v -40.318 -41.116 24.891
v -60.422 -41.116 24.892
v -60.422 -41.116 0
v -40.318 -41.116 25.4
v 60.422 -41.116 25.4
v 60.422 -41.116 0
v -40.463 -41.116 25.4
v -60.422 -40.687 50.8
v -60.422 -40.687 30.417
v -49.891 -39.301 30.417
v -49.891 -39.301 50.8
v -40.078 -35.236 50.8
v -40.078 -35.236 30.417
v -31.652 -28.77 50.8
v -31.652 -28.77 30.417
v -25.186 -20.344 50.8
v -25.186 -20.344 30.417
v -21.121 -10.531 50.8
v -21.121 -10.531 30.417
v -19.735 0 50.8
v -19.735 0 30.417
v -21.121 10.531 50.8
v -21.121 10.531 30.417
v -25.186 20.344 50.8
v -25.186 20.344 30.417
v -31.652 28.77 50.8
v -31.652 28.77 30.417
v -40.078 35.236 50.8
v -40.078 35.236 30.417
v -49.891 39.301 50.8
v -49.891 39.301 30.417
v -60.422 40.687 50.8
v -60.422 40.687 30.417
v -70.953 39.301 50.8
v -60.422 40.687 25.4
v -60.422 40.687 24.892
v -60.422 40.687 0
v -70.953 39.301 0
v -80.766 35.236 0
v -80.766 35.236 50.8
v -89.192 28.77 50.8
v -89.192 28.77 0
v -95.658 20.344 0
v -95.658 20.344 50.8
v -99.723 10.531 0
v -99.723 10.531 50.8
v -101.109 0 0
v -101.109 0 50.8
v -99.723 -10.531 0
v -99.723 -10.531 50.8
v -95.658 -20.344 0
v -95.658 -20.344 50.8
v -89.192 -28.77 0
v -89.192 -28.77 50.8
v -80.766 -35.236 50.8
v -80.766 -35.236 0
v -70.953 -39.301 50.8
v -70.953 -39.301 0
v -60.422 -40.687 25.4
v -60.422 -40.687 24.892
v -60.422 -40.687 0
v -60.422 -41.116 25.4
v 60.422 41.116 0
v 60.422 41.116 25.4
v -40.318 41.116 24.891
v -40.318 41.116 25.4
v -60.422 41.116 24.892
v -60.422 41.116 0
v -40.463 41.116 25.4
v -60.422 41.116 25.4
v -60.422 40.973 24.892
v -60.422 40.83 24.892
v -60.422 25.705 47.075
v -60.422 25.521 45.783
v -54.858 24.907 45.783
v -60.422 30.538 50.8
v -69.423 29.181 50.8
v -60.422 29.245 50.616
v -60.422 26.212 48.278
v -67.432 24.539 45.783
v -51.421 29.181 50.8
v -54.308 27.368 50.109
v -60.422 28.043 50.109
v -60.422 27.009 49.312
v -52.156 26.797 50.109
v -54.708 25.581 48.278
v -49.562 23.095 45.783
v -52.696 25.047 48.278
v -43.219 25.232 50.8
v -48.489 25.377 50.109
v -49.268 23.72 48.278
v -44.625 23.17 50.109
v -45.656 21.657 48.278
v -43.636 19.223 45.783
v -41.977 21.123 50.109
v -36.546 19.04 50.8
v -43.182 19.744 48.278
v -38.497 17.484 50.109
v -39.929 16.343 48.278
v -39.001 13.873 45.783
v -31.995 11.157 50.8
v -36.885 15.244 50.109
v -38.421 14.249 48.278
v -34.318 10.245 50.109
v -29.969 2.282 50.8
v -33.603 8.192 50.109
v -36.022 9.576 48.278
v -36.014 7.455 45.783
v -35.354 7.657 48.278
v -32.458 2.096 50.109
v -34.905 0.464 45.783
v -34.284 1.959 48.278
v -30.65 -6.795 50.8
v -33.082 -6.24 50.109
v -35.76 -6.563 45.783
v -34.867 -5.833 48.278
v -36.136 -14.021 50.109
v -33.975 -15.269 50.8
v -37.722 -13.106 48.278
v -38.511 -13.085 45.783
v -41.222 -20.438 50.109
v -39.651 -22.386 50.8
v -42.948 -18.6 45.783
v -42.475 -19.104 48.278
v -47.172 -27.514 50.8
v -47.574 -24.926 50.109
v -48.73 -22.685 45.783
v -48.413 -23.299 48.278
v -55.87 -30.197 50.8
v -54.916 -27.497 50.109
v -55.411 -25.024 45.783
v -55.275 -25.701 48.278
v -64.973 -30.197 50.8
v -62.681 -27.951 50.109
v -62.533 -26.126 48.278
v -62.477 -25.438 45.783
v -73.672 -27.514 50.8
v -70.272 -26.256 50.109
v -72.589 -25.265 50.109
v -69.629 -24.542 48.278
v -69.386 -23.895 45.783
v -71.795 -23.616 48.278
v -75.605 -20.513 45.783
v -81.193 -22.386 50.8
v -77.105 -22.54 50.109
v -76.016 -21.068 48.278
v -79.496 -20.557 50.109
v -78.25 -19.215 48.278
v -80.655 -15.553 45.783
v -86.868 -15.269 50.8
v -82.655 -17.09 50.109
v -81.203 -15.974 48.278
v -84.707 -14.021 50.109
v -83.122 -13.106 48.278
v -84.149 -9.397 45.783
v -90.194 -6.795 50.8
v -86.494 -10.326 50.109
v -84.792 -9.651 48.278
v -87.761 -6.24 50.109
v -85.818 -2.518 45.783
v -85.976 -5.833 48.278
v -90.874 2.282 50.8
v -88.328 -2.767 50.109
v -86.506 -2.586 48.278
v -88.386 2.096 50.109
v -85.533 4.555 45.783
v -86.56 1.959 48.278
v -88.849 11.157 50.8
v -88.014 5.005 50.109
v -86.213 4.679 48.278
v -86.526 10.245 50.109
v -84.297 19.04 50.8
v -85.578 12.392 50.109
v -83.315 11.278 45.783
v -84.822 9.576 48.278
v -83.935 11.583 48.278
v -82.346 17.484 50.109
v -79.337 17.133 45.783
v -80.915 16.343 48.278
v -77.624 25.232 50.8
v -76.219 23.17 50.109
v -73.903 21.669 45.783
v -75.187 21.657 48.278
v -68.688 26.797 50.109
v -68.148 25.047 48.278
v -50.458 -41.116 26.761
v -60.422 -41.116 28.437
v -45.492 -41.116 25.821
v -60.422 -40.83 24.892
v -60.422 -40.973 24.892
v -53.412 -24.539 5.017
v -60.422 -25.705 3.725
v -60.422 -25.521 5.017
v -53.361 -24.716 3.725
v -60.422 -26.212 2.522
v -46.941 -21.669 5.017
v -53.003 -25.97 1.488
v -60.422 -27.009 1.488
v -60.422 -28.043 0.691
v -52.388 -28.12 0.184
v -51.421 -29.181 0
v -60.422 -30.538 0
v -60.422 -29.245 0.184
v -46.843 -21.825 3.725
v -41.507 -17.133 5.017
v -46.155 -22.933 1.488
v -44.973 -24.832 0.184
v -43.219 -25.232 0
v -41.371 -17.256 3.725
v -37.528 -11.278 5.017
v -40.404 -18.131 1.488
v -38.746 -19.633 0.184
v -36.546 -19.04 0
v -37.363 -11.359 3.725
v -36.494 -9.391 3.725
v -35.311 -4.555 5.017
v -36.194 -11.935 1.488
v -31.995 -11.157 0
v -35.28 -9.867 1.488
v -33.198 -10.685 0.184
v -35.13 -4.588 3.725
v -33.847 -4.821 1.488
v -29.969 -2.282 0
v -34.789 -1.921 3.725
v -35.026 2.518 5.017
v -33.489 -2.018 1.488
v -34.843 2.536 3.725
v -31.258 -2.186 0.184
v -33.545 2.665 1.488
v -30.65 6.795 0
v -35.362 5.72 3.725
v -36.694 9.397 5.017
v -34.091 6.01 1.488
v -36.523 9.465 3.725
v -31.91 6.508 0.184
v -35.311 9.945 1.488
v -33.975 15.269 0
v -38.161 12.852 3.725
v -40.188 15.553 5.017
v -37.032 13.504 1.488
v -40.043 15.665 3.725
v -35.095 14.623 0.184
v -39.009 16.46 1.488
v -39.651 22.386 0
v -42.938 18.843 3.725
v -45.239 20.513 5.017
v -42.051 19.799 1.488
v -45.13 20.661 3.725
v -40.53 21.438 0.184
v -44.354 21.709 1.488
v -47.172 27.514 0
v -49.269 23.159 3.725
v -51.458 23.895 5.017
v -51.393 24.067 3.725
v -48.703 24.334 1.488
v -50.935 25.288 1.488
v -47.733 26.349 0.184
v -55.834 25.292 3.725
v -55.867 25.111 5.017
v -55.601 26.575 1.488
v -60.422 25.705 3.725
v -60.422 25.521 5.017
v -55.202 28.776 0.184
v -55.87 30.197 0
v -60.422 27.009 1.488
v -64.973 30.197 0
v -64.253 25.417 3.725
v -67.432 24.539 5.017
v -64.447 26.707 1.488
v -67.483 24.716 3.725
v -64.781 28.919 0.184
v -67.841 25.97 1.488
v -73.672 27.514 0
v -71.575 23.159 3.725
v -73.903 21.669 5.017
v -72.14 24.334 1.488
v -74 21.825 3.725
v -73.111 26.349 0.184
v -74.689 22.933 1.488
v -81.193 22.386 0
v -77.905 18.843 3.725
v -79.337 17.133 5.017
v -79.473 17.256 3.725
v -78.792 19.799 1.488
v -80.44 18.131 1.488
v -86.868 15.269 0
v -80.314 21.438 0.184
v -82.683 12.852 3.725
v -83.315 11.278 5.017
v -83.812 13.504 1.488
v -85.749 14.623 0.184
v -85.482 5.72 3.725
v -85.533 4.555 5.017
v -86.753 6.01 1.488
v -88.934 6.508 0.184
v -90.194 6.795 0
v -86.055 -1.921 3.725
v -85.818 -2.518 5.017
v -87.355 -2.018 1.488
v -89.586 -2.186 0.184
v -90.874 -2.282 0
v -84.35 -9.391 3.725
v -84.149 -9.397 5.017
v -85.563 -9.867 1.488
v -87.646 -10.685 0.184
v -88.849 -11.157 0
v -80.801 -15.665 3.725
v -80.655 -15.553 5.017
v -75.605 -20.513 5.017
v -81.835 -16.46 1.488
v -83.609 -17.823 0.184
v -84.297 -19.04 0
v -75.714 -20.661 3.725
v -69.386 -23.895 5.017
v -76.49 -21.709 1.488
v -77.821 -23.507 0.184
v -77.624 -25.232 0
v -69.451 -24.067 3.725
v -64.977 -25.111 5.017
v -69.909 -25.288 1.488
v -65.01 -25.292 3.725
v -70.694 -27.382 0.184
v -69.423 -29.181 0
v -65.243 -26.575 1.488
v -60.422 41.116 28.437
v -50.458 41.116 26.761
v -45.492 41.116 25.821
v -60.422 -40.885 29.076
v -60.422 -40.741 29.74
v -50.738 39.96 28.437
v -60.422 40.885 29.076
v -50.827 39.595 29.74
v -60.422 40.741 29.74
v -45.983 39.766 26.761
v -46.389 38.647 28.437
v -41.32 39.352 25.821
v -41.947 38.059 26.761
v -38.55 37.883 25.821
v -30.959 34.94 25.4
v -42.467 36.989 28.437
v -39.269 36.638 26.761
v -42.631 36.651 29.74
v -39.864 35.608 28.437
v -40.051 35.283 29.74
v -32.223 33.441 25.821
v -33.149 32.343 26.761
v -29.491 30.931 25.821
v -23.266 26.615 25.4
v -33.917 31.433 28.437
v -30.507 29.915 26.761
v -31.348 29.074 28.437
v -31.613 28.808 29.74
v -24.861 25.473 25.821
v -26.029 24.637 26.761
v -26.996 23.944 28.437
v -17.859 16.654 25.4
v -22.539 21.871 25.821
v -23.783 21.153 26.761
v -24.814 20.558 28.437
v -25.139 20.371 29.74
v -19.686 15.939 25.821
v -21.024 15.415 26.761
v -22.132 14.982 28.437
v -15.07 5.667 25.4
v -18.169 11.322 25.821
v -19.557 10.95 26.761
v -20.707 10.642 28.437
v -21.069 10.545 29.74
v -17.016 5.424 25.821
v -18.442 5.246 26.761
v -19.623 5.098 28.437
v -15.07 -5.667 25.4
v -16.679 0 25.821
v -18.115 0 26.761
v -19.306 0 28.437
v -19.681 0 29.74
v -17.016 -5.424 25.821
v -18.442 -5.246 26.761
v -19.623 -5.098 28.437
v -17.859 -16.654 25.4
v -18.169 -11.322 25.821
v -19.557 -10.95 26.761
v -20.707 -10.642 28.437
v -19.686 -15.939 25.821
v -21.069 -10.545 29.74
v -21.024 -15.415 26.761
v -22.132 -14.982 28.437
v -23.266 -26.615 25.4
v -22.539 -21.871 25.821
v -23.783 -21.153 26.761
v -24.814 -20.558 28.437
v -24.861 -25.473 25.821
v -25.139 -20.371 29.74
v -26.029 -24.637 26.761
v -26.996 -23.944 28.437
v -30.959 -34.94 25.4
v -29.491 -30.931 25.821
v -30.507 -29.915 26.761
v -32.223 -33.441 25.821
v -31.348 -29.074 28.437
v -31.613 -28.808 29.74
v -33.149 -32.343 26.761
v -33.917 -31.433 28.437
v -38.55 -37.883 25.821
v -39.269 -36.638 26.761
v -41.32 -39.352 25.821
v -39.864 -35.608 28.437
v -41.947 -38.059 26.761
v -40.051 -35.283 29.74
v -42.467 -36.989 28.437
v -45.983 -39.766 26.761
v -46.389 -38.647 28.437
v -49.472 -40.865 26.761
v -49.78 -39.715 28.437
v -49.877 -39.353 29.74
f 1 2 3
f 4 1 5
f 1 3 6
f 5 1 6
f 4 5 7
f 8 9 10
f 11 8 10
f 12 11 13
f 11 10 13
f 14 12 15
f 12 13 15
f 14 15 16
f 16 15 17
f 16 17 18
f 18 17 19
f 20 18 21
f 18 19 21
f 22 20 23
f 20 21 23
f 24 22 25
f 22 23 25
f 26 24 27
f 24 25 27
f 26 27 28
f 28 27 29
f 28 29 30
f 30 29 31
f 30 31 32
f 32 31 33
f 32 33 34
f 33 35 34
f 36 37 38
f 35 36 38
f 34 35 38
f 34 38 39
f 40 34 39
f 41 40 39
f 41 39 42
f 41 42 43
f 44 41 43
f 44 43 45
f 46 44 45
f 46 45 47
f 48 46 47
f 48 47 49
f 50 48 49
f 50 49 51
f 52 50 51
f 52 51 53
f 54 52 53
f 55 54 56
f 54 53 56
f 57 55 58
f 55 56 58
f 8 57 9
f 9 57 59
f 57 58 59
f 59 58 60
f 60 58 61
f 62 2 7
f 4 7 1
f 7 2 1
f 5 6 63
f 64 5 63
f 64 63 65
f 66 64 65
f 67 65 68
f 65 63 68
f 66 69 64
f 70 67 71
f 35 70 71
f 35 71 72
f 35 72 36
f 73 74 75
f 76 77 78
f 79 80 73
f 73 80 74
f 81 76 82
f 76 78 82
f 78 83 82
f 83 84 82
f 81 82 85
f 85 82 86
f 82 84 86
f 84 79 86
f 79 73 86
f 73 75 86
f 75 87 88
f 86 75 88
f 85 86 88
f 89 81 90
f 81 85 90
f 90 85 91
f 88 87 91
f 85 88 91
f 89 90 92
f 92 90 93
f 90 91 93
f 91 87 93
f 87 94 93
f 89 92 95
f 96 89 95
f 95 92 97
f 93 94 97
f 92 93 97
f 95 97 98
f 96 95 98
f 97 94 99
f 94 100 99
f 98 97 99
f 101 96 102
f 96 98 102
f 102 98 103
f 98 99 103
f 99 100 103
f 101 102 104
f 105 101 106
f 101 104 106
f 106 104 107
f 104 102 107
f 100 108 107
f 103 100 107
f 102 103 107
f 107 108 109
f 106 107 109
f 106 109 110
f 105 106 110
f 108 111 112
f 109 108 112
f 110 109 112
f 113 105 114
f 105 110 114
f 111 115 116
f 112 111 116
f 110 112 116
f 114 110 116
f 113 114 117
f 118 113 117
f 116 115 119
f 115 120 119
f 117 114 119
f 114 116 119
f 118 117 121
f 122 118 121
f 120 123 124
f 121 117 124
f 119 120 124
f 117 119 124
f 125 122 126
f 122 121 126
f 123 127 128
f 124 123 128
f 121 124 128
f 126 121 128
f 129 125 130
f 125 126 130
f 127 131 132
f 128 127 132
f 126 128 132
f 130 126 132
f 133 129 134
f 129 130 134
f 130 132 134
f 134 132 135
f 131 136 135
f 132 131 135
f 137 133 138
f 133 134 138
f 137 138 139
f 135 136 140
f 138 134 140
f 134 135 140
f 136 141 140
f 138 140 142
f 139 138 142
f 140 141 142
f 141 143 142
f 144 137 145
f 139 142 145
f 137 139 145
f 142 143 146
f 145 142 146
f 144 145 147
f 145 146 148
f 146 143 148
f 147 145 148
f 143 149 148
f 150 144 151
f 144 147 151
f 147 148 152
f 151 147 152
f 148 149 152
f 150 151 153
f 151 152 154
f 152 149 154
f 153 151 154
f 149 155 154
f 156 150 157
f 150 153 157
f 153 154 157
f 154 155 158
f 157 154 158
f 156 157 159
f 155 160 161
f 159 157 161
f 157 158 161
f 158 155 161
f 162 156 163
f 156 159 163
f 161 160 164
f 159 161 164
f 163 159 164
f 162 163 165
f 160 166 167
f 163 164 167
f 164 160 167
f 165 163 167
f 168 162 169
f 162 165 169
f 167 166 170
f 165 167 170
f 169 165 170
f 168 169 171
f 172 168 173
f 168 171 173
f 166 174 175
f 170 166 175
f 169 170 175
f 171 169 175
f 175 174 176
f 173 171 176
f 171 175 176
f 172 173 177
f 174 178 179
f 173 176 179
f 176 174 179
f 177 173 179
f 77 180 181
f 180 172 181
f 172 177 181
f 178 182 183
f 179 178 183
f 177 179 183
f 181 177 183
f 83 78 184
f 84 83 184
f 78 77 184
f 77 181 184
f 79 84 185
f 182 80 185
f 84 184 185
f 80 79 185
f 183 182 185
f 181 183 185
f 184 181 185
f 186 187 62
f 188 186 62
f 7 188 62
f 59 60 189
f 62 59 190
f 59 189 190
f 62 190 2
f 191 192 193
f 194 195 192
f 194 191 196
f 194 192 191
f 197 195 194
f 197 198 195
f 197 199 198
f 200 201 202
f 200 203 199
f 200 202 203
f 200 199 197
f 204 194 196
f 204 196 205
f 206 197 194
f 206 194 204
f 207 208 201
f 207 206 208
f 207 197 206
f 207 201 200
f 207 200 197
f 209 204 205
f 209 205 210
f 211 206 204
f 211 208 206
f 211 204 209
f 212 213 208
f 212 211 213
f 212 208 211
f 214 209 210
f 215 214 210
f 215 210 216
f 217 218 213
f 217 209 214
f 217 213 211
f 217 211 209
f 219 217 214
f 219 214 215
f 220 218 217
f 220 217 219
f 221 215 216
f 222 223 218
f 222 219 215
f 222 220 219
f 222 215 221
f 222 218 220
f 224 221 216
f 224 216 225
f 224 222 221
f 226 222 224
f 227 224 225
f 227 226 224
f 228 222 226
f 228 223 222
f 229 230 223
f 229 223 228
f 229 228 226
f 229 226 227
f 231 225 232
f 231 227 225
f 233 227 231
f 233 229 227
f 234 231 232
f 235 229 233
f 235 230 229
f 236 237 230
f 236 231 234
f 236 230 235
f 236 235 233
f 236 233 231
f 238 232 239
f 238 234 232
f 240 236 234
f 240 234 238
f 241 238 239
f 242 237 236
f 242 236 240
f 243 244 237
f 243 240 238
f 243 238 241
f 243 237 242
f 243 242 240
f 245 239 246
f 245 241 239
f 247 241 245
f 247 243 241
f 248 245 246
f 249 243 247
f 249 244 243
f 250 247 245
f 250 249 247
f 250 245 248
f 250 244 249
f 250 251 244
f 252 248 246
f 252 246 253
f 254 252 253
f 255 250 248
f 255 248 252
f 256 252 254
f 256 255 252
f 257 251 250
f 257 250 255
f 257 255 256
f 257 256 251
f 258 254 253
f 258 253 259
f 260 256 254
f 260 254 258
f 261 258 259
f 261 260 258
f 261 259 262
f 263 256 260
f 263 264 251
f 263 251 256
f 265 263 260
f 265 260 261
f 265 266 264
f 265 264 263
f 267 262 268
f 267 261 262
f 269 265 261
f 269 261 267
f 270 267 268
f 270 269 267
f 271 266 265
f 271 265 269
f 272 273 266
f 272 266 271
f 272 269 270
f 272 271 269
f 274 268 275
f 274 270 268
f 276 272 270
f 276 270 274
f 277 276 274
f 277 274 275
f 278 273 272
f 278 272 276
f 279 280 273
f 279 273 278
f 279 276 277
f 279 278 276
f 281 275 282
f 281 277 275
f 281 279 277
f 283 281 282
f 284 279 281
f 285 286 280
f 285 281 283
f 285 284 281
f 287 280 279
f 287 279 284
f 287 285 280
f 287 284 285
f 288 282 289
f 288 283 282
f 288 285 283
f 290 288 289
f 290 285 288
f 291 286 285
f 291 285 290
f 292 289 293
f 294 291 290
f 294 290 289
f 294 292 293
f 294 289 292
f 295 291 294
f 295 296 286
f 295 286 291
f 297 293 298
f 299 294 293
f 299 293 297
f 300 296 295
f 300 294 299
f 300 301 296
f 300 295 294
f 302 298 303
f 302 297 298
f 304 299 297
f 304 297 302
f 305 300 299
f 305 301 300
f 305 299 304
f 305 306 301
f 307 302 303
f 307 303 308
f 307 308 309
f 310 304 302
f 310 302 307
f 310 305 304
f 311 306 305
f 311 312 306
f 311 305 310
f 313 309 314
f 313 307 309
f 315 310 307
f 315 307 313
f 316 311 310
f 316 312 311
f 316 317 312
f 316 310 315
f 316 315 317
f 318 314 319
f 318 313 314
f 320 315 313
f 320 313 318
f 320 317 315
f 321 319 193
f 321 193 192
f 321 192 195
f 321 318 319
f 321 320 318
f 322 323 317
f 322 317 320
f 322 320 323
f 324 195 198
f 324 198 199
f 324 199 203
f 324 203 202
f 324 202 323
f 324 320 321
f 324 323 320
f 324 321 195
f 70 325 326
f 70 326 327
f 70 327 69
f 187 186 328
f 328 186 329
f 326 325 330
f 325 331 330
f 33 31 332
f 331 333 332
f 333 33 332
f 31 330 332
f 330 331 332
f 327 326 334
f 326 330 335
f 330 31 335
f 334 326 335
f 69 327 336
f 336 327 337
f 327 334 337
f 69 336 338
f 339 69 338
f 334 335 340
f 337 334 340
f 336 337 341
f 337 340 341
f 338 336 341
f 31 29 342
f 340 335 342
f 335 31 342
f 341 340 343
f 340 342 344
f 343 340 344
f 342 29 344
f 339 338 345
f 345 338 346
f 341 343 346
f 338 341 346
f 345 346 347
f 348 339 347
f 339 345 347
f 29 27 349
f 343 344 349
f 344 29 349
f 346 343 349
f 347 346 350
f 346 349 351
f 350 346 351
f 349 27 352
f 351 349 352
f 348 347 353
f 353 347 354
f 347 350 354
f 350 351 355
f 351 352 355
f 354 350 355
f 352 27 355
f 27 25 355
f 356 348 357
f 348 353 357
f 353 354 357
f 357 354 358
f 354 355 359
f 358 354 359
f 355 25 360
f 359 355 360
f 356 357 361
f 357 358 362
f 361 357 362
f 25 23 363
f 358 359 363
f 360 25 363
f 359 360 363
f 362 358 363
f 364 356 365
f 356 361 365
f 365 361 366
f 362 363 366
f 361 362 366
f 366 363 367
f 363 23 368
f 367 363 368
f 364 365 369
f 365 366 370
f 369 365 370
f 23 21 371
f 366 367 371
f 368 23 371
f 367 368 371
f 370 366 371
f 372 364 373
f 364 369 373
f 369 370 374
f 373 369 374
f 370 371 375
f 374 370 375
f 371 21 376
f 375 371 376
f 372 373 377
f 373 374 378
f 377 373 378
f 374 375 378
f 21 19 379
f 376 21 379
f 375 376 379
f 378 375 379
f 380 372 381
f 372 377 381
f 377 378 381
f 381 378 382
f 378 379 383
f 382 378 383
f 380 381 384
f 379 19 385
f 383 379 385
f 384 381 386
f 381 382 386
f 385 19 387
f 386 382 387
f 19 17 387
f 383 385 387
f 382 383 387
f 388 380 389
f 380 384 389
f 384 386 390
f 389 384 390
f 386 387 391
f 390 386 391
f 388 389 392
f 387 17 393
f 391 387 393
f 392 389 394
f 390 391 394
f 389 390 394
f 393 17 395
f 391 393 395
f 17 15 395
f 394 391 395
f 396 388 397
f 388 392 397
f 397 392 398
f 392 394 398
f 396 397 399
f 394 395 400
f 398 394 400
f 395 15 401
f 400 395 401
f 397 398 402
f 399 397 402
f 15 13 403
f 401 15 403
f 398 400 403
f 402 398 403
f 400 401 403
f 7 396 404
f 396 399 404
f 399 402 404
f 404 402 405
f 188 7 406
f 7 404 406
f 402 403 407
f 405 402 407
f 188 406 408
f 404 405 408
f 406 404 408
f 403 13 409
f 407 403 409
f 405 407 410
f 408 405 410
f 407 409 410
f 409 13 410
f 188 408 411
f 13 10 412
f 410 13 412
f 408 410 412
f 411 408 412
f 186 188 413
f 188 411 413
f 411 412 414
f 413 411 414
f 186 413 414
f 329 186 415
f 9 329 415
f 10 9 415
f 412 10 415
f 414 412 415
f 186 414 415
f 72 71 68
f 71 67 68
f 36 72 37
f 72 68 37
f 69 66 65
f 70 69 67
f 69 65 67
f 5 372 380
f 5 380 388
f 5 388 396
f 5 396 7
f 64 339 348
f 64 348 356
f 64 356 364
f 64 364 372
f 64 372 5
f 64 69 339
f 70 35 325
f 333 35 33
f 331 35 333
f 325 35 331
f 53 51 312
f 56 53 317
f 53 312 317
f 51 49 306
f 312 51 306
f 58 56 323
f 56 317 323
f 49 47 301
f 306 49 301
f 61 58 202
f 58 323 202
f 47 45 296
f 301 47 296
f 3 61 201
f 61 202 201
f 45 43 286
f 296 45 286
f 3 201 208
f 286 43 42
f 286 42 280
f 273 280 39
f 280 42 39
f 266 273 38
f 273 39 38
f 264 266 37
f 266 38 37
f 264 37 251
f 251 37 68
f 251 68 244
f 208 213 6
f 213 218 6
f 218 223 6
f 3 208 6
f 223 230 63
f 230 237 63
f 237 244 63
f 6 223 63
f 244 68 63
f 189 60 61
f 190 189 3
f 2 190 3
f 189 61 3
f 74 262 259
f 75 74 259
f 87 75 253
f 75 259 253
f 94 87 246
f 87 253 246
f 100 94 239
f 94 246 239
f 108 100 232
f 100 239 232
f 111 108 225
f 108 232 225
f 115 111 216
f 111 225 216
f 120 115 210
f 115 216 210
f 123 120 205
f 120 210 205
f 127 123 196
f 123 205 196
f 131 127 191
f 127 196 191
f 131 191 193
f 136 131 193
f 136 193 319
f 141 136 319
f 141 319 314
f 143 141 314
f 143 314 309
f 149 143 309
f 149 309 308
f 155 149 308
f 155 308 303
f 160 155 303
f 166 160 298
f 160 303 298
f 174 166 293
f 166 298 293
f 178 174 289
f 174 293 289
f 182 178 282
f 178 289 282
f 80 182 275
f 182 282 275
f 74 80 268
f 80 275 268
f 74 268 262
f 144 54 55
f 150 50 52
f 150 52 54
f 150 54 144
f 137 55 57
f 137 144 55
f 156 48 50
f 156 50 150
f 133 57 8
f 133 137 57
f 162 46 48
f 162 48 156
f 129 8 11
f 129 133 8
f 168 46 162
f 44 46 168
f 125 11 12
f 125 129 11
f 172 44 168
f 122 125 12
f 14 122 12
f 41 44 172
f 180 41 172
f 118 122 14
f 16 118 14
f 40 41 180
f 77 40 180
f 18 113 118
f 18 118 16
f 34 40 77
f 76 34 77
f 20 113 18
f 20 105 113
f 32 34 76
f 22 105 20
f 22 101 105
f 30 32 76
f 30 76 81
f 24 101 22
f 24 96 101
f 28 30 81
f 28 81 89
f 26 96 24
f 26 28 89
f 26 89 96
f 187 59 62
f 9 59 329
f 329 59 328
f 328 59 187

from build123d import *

# Parameters (mm, degrees)
F1_DEPTH    = 25.4
F2_DEPTH    = 50.8
F4_T4_ANGLE = 180


# Not quite as in the source:
# - a fillet or chamfer that OpenCascade refuses, or shapes differently, is made with other operations: its cross-section is extruded or revolved along the edge and cut away or added
# - a feature of the source that left no trace in its solid (it failed there, or was rolled back) is left out


with BuildPart() as f1:
    # F0 (on Top) → F1 (new body)
    with BuildSketch(Plane.XY):
        with BuildLine():
            Line((60.4218803346, 41.1163568497), (-60.4218803346, 41.1163568497))
            Line((-60.4218803346, 41.1163568497), (-60.4218803346, 40.6873208554))
            ThreePointArc((-60.4218803346, 40.6873208554), (-31.6515998495, 28.7702804852), (-19.7345594792, 0))
            ThreePointArc((-19.7345594792, 0), (-31.6515998495, -28.7702804852), (-60.4218803346, -40.6873208554))
            Line((-60.4218803346, -40.6873208554), (-60.4218803346, -41.1163568497))
            Line((-60.4218803346, -41.1163568497), (60.4218803346, -41.1163568497))
            Line((60.4218803346, -41.1163568497), (60.4218803346, 41.1163568497))
        make_face()
        with BuildLine():
            ThreePointArc((-19.7345594792, 0), (-31.6515998495, 28.7702804852), (-60.4218803346, 40.6873208554))
            Line((-60.4218803346, 40.6873208554), (-60.4218803346, 25.5206269771))
            ThreePointArc((-60.4218803346, 25.5206269771), (-42.376071939, 18.0458083957), (-34.9012533575, 0))
            ThreePointArc((-34.9012533575, 0), (-42.376071939, -18.0458083957), (-60.4218803346, -25.5206269771))
            Line((-60.4218803346, -25.5206269771), (-60.4218803346, -40.6873208554))
            ThreePointArc((-60.4218803346, -40.6873208554), (-31.6515998495, -28.7702804852), (-19.7345594792, 0))
        make_face()
        with BuildLine():
            Line((-60.4218803346, 25.5206269771), (-60.4218803346, 40.6873208554))
            ThreePointArc((-60.4218803346, 40.6873208554), (-101.10920119, 0), (-60.4218803346, -40.6873208554))
            Line((-60.4218803346, -40.6873208554), (-60.4218803346, -25.5206269771))
            ThreePointArc((-60.4218803346, -25.5206269771), (-85.9425073118, 0), (-60.4218803346, 25.5206269771))
        make_face()
    extrude(amount=F1_DEPTH)

    # F0 (on Top) → F2 (join)
    with BuildSketch(Plane.XY):
        with BuildLine():
            Line((-60.4218803346, 25.5206269771), (-60.4218803346, 40.6873208554))
            ThreePointArc((-60.4218803346, 40.6873208554), (-101.10920119, 0), (-60.4218803346, -40.6873208554))
            Line((-60.4218803346, -40.6873208554), (-60.4218803346, -25.5206269771))
            ThreePointArc((-60.4218803346, -25.5206269771), (-85.9425073118, 0), (-60.4218803346, 25.5206269771))
        make_face()
        with BuildLine():
            ThreePointArc((-19.7345594792, 0), (-31.6515998495, 28.7702804852), (-60.4218803346, 40.6873208554))
            Line((-60.4218803346, 40.6873208554), (-60.4218803346, 25.5206269771))
            ThreePointArc((-60.4218803346, 25.5206269771), (-42.376071939, 18.0458083957), (-34.9012533575, 0))
            ThreePointArc((-34.9012533575, 0), (-42.376071939, -18.0458083957), (-60.4218803346, -25.5206269771))
            Line((-60.4218803346, -25.5206269771), (-60.4218803346, -40.6873208554))
            ThreePointArc((-60.4218803346, -40.6873208554), (-31.6515998495, -28.7702804852), (-19.7345594792, 0))
        make_face()
    extrude(amount=F2_DEPTH)

    # F4: fillet of radius 5.08 on 6 edges, made by hand


with BuildPart() as f4_tool2:
    # F4_s3 → F4_t4 (revolve)
    with BuildSketch(Plane.YZ.offset(-60.4218803346)):
        with BuildLine():
            ThreePointArc((45.7682865408, 25.3996), (42.175218407, 26.8878975516), (40.6869208554, 30.4809656854))
            Line((40.6869208554, 30.4809656854), (40.1787842868, 30.4809656854))
            ThreePointArc((40.1787842868, 30.4809656854), (40.1791842868, 27.9404828427), (40.1791842868, 25.4))
            Line((40.1791842868, 25.4), (40.6873208554, 24.8918634315))
            ThreePointArc((40.6873208554, 24.8918634315), (43.2278036981, 24.8918634315), (45.7682865408, 24.8914634315))
            Line((45.7682865408, 24.8914634315), (45.7682865408, 25.3996))
        make_face()
    revolve(axis=Axis((-60.4218803346, 0, 25.4), (0, 0, -1)), revolution_arc=F4_T4_ANGLE)

    split(bisect_by=Plane.XZ.offset(-41.1163568497), keep=Keep.TOP)

    split(bisect_by=Plane.XZ.offset(41.1163568497), keep=Keep.BOTTOM)


with BuildPart() as f1_1:
    add(f1.part)

    # F4_t1: union F4_tool2
    add(f4_tool2.part)

    # F4_s7 → F4_t8 (revolve, cut)
    with BuildSketch(Plane.YZ.offset(-60.4218803346)):
        with BuildLine():
            ThreePointArc((30.6015926626, 50.8004), (27.0085245287, 49.3121024484), (25.5202269771, 45.7190343146))
            Line((25.5202269771, 45.7190343146), (25.0120904086, 45.7190343146))
            ThreePointArc((25.0120904086, 45.7190343146), (25.0124904086, 48.2595171573), (25.0124904086, 50.8))
            Line((25.0124904086, 50.8), (25.5206269771, 51.3081365685))
            ThreePointArc((25.5206269771, 51.3081365685), (28.0611098198, 51.3081365685), (30.6015926626, 51.3085365685))
            Line((30.6015926626, 51.3085365685), (30.6015926626, 50.8004))
        make_face()
    revolve(axis=Axis((-60.4218803346, 0, 50.8), (0, 0, -1)), mode=Mode.SUBTRACT)

    # F4_s9 → F4_t10 (revolve, cut)
    with BuildSketch(Plane.YZ.offset(-60.4218803346)):
        with BuildLine():
            ThreePointArc((-25.5202269771, 5.0809656854), (-27.0085245287, 1.4878975516), (-30.6015926626, -0.0004))
            Line((-30.6015926626, -0.0004), (-30.6015926626, -0.5085365685))
            ThreePointArc((-30.6015926626, -0.5085365685), (-28.0611098198, -0.5081365685), (-25.5206269771, -0.5081365685))
            Line((-25.5206269771, -0.5081365685), (-25.0124904086, 0))
            ThreePointArc((-25.0124904086, 0), (-25.0124904086, 2.5404828427), (-25.0120904086, 5.0809656854))
            Line((-25.0120904086, 5.0809656854), (-25.5202269771, 5.0809656854))
        make_face()
    revolve(axis=Axis((-60.4218803346, 0, 0), (0, 0, 1)), mode=Mode.SUBTRACT)


solid = f1_1.part
